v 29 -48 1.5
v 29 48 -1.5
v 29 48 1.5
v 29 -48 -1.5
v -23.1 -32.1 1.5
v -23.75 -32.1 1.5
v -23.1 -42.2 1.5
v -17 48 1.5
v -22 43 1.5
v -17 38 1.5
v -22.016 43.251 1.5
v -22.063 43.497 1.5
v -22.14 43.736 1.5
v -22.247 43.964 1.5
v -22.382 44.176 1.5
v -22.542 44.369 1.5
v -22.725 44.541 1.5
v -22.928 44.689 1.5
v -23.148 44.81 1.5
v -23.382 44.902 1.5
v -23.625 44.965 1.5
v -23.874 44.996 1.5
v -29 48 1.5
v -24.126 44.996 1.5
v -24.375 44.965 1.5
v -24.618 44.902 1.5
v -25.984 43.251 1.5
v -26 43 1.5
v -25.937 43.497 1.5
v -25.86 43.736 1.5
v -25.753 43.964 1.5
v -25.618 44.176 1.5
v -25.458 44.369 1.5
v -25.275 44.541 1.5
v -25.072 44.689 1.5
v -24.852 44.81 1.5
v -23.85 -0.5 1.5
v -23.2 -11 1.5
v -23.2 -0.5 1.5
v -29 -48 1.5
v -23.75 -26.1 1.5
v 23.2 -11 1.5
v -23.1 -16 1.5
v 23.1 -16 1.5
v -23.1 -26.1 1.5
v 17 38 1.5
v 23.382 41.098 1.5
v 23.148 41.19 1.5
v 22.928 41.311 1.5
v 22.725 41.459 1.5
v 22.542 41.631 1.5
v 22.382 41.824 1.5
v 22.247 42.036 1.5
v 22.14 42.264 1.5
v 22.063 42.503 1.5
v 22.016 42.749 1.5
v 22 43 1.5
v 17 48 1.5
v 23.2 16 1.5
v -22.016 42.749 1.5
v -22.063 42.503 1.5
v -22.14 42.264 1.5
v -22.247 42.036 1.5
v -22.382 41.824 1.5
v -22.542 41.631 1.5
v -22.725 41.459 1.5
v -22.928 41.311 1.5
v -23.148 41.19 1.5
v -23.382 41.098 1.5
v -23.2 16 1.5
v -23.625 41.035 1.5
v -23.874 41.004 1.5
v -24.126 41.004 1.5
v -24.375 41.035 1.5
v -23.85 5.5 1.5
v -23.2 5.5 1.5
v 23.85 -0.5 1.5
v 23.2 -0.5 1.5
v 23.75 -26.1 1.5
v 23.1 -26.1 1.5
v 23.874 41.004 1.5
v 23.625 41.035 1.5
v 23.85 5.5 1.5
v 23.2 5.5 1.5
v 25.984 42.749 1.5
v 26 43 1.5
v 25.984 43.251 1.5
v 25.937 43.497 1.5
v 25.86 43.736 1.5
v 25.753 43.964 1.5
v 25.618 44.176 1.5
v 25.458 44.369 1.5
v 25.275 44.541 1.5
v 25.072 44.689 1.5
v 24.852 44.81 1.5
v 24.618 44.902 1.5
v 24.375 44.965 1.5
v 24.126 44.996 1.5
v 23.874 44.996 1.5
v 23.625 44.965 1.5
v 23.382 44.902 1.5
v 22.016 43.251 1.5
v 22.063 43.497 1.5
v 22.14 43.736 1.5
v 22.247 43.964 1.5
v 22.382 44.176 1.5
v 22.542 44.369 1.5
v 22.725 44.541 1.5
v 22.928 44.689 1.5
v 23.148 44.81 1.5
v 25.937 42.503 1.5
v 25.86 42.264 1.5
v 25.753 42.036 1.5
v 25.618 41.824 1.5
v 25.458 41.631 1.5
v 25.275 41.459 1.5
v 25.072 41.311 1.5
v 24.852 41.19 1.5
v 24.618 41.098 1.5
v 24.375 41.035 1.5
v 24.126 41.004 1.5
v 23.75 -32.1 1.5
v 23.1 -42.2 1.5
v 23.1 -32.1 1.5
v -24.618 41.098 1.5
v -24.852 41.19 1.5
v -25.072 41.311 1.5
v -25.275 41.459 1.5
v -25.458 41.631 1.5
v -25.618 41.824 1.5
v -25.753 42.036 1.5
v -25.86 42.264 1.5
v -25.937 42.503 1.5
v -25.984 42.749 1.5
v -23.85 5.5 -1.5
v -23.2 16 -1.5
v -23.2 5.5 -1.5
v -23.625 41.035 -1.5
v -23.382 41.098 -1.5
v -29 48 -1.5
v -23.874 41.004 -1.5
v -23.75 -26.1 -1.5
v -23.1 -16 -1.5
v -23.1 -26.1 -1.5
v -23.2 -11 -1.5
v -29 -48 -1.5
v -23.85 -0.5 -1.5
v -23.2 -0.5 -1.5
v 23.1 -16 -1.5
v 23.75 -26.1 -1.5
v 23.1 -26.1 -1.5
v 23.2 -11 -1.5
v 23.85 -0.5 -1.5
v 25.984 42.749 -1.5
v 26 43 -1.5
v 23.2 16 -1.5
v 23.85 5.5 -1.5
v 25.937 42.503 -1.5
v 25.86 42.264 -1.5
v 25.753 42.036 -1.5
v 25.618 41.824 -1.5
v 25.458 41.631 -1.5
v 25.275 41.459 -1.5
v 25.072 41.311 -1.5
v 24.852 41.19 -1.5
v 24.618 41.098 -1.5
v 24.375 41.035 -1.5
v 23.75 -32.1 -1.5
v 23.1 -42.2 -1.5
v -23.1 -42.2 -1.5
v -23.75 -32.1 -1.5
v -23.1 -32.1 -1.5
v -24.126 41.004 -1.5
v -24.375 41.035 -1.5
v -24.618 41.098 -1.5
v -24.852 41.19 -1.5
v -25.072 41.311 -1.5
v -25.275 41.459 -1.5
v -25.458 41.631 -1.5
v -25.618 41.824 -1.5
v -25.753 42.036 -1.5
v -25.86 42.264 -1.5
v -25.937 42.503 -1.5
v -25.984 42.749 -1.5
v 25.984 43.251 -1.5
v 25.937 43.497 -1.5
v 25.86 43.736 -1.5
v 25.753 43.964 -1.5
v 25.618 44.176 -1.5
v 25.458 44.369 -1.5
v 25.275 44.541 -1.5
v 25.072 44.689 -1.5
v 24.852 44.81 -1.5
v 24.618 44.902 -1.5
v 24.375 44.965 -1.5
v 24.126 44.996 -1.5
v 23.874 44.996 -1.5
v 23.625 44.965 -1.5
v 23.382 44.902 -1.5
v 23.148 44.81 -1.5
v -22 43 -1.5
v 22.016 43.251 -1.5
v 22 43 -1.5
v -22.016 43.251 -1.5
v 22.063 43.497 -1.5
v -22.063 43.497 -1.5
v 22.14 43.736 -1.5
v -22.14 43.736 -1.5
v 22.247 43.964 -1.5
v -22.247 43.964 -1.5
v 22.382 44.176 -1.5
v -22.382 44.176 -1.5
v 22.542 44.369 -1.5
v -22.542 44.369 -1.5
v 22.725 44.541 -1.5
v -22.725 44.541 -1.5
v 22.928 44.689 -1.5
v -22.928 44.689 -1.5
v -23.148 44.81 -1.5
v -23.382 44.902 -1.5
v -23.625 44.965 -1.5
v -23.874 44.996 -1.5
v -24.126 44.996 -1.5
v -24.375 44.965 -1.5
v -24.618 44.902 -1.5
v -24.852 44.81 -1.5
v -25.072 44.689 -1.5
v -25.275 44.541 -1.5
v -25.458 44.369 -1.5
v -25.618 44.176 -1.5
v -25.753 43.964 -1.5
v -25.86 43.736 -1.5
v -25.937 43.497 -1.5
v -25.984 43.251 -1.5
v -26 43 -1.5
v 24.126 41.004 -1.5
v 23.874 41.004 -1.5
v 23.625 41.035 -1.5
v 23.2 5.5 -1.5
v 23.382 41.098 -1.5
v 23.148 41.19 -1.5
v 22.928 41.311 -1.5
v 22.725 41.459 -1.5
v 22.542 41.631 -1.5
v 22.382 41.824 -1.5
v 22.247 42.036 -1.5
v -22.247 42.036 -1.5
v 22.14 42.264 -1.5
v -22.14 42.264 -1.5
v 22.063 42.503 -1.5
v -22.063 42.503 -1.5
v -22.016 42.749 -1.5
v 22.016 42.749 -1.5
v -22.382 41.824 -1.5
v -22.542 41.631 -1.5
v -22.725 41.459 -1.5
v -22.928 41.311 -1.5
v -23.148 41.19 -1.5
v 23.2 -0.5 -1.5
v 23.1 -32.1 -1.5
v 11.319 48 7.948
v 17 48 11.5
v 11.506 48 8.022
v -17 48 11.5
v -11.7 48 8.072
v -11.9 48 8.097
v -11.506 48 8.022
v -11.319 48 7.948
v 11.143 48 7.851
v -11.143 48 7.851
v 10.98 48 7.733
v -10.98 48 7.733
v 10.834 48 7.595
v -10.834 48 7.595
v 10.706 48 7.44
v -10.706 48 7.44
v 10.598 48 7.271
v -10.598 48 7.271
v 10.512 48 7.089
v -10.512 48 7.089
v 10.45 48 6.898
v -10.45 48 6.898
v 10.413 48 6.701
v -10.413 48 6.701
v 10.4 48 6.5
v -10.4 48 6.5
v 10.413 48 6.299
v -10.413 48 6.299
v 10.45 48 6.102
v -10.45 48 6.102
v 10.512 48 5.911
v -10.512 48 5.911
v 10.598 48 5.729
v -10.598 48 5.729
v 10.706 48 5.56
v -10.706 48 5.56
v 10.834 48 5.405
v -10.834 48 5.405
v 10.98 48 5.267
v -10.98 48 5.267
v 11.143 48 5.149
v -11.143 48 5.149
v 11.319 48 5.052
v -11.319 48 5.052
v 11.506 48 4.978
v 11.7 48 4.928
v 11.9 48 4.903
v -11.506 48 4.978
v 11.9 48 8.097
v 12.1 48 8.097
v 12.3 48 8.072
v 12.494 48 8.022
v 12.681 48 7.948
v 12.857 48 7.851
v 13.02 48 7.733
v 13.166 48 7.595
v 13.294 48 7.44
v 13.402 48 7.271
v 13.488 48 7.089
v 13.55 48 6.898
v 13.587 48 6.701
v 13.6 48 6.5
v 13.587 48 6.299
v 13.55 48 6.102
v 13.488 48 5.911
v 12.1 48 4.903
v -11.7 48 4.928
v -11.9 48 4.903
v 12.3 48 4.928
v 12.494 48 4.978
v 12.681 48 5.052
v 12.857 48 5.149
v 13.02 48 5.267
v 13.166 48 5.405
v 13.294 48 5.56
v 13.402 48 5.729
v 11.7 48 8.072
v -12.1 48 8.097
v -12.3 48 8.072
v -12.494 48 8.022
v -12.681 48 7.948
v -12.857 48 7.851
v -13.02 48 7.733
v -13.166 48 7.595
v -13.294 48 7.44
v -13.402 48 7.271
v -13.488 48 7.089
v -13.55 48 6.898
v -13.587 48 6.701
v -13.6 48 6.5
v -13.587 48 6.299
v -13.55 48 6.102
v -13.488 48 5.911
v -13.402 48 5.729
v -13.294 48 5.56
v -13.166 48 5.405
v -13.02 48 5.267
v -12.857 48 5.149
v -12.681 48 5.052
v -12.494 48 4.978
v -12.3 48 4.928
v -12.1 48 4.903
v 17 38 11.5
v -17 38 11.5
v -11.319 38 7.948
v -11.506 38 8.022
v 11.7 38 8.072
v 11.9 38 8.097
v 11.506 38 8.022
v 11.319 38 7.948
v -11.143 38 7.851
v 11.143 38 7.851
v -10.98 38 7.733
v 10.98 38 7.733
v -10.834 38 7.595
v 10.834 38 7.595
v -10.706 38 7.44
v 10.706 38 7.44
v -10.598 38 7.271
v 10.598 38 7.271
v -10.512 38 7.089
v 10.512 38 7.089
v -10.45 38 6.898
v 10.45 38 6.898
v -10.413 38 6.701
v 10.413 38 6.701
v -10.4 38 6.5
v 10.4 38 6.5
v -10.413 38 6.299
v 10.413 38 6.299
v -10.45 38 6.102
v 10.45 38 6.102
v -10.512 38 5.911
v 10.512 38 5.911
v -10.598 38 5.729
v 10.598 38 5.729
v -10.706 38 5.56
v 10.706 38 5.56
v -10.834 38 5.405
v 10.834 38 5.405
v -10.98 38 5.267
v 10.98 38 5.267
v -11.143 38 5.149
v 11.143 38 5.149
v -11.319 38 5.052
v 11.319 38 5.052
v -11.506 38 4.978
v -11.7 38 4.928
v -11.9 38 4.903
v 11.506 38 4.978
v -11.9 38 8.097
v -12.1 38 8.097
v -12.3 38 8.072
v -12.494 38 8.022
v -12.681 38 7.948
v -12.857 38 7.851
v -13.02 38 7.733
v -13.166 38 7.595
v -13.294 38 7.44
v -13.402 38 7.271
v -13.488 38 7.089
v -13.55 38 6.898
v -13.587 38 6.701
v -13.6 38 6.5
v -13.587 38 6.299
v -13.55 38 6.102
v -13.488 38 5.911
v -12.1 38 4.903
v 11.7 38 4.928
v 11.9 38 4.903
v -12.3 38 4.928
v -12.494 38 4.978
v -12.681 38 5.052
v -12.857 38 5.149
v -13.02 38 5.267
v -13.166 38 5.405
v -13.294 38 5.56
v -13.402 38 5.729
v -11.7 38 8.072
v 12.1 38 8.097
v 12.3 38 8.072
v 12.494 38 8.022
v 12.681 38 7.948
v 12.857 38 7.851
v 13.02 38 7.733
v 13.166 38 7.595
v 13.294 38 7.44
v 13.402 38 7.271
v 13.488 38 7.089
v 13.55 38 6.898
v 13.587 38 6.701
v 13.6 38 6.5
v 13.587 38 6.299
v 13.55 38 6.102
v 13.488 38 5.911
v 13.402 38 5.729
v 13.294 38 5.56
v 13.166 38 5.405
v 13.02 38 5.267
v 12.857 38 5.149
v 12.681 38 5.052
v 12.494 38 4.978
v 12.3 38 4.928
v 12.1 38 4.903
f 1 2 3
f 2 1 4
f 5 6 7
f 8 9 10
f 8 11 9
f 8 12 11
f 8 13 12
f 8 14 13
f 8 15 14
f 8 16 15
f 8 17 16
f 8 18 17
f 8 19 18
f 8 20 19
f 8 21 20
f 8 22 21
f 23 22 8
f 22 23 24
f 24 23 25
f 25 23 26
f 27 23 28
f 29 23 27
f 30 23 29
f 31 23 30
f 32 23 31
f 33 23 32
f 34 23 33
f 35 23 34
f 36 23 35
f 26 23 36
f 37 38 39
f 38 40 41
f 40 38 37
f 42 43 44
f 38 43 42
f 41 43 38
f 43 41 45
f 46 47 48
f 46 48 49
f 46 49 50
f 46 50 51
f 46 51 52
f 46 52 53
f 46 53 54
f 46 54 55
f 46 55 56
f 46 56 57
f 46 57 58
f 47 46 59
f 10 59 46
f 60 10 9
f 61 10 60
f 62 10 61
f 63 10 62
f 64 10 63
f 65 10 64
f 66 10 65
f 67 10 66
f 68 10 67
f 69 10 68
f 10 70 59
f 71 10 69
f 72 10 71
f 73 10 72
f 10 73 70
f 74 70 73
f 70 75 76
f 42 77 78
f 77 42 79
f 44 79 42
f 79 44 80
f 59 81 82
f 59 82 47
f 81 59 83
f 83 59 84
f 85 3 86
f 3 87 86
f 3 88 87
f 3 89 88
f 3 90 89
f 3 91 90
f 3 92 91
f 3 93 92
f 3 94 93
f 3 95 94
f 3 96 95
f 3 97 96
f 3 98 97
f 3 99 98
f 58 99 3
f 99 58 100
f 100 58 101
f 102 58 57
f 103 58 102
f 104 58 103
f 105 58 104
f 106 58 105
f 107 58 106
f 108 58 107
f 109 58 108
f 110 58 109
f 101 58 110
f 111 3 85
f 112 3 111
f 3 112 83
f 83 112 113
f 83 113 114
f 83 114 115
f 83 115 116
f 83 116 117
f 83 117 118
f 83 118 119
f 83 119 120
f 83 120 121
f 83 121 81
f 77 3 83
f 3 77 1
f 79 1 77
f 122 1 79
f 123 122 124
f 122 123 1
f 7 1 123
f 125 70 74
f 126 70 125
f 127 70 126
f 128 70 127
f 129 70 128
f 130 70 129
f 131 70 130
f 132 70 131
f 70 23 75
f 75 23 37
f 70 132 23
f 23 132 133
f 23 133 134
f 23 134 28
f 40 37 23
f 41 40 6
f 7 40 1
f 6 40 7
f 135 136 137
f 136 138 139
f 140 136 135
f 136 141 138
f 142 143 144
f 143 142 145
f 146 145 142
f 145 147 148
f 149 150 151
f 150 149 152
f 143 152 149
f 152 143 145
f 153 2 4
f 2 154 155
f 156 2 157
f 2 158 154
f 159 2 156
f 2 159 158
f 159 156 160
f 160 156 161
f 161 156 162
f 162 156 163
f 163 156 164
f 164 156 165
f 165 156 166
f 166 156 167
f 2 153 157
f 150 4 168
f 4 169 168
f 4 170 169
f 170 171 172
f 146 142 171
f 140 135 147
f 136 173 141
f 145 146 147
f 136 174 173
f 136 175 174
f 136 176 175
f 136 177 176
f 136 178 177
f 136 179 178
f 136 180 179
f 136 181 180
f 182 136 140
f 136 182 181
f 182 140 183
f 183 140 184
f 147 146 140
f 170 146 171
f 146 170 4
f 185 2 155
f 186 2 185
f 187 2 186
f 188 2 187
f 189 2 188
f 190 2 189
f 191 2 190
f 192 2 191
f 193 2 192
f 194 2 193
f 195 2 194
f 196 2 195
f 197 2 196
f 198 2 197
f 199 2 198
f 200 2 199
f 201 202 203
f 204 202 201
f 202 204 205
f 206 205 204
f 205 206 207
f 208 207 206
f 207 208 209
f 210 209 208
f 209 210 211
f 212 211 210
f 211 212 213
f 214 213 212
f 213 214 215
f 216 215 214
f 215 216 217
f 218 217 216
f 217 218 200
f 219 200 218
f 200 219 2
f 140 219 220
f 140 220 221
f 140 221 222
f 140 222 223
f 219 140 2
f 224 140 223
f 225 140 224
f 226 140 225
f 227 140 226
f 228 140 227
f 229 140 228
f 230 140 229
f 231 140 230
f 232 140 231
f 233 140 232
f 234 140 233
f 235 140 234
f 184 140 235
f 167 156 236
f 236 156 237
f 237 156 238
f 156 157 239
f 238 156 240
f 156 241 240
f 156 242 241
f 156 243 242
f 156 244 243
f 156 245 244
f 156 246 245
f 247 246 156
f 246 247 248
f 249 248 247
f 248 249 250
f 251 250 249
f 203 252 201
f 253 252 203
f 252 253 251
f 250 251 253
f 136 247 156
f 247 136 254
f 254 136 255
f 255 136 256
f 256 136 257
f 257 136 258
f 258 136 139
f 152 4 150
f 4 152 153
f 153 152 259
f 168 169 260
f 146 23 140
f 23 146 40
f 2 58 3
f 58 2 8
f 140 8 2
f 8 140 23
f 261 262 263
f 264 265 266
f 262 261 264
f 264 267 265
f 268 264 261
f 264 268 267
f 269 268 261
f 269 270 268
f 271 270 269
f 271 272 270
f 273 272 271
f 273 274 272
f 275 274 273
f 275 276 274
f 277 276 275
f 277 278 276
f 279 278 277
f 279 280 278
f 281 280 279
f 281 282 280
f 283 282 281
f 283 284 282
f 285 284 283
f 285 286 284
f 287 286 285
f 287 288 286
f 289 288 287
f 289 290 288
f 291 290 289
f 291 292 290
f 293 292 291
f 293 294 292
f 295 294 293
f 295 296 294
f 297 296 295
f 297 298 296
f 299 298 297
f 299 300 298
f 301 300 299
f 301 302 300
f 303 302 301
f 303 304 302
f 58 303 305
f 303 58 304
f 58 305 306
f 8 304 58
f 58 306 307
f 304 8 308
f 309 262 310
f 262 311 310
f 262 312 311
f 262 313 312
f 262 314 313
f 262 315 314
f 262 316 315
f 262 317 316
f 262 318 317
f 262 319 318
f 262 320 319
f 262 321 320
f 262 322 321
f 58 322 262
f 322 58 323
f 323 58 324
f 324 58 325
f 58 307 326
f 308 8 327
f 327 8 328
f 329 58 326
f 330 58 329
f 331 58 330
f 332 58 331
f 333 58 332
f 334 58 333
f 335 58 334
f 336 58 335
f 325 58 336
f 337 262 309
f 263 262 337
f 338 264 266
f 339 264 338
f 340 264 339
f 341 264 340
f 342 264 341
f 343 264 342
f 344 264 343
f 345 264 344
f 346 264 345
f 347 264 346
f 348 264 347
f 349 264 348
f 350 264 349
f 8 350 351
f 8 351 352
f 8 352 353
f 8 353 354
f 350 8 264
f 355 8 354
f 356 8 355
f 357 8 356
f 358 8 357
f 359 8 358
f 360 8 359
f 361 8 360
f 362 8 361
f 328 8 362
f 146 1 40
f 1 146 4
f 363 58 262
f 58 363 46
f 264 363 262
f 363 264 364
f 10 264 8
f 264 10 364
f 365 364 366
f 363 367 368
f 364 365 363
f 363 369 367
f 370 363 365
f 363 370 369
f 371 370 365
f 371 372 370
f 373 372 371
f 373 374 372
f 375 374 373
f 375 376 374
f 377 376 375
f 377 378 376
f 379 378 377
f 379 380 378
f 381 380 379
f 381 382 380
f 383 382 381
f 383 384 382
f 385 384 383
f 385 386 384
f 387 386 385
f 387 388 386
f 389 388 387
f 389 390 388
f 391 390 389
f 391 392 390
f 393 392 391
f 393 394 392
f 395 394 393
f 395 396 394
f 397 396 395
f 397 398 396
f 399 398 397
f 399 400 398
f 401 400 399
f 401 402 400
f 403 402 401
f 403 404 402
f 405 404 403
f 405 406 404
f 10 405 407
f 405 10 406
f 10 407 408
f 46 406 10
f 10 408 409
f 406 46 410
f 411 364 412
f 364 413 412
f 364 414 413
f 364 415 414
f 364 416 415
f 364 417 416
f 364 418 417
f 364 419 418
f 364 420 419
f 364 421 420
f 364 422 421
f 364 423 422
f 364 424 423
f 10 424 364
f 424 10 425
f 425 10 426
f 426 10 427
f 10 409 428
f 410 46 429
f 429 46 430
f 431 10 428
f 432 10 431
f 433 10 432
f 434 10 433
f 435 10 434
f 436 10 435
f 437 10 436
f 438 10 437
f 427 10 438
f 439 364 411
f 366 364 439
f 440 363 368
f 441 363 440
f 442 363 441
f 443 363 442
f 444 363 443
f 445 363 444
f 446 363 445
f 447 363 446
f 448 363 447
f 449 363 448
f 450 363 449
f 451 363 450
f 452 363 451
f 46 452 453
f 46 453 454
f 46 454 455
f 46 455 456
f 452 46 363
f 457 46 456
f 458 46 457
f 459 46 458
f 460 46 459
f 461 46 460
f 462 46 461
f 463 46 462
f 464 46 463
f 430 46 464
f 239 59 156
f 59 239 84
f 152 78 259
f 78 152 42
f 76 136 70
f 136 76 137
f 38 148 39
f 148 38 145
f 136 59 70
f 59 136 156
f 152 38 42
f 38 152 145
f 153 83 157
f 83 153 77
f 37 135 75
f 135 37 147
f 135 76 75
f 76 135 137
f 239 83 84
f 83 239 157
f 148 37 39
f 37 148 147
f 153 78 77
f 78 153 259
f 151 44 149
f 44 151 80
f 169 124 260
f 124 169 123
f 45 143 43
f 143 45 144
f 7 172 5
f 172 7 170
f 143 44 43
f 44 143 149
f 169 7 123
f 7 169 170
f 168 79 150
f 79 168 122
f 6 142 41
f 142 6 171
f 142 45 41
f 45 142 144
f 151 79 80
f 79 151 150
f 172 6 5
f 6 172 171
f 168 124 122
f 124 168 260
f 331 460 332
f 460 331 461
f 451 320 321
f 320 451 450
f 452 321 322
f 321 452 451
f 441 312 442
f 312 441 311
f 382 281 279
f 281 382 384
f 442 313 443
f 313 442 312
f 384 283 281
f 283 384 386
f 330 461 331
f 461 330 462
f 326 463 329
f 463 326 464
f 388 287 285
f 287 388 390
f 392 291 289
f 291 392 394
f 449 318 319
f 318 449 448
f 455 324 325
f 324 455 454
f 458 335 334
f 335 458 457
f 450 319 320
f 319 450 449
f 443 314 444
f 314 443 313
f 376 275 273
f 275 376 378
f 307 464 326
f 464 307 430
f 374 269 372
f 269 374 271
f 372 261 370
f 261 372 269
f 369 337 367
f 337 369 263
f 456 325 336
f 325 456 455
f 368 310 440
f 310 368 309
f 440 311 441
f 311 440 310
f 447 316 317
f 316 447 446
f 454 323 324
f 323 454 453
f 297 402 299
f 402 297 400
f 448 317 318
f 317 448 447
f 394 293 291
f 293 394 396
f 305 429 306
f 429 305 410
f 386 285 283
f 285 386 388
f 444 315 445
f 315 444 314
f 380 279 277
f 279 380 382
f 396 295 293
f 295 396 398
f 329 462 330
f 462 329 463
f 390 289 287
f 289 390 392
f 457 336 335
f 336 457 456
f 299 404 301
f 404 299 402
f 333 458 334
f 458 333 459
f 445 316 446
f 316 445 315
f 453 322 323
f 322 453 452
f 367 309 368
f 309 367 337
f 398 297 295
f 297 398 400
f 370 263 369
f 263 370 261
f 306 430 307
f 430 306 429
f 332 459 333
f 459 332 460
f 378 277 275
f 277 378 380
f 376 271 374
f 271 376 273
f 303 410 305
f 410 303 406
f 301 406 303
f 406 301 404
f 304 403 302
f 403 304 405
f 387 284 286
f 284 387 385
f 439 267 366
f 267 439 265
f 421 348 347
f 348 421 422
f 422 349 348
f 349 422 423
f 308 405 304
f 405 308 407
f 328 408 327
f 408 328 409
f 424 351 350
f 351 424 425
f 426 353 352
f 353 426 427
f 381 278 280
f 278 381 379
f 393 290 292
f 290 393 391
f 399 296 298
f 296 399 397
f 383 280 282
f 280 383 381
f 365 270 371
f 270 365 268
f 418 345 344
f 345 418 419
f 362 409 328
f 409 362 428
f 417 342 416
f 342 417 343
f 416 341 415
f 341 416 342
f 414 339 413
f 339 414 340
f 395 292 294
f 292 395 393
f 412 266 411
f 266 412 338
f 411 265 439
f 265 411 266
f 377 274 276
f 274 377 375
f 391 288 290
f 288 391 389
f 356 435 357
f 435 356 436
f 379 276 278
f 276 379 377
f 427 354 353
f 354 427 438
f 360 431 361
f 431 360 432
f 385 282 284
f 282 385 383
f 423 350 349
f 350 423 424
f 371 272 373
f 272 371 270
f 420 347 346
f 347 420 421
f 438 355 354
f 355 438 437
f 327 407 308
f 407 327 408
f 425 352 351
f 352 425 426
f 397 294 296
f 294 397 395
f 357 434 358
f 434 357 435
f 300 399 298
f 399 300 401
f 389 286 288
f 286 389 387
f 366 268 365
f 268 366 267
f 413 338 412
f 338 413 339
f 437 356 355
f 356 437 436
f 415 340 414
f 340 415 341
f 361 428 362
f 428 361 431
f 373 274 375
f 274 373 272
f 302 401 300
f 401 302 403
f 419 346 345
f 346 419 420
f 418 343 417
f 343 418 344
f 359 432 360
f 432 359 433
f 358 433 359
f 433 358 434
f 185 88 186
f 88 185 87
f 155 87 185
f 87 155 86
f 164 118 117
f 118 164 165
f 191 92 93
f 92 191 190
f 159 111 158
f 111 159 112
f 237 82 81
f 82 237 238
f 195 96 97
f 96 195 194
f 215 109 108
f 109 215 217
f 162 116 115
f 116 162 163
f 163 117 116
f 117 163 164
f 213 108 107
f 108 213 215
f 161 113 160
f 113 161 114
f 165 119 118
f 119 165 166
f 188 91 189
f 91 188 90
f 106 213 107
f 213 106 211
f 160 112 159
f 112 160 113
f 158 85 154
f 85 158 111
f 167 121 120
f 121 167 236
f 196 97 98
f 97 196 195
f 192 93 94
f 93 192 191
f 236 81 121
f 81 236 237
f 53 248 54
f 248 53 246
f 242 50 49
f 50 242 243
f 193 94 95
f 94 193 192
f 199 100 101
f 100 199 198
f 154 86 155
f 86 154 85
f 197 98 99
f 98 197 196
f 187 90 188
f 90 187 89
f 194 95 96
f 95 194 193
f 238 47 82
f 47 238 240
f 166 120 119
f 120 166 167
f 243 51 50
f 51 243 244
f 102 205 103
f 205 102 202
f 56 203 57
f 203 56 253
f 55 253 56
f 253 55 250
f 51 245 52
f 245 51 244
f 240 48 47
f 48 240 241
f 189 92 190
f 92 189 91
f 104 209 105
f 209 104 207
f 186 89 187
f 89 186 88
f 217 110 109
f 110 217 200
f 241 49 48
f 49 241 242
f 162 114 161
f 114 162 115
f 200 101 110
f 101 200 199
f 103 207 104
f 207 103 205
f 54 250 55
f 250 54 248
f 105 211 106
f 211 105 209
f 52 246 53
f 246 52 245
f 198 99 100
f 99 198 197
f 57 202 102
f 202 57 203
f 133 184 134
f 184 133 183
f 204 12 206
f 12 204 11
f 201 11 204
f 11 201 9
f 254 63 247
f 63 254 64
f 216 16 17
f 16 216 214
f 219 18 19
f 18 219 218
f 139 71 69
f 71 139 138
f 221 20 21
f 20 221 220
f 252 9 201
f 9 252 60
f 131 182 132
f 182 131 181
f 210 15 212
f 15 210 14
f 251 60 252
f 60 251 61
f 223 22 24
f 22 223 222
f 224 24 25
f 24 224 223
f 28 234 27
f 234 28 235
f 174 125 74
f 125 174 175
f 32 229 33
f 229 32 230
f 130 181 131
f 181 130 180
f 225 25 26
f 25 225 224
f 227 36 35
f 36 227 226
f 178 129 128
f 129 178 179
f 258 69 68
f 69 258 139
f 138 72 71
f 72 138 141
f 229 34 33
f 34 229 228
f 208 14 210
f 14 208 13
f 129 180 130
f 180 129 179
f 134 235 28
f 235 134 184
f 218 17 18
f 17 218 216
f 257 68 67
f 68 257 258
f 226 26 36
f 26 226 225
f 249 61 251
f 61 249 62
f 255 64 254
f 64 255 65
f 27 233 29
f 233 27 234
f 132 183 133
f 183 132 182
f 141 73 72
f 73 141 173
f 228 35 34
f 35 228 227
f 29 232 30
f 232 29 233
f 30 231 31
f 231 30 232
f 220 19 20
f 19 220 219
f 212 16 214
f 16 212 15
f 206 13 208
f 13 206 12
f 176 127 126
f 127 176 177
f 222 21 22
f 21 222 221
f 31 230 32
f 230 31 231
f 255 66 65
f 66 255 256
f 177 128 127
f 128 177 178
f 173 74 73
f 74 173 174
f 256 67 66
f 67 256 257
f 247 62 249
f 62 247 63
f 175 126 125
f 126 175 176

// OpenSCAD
// meter bezel

water_meter_height = 27;
water_meter_length = 46.4;
meter_height = 26.2;
meter_length = 46.2;

// distance from top
glass_blackout = 32;
meter_separation = 32;

bezel_margin = 6;
bezel_thickness = 3;
bezel_height = glass_blackout + 13 + meter_separation + 13 + bezel_margin;
bezel_width = 46 + 2 * bezel_margin;

m4_dia = 4;
m4_pilot = 3.2;
vert_m4_x_offset = (bezel_width - (2*10) - 4 - 10)/2;

mounting_block_thickness = 10;
mounting_block_depth = 10;

$fn = 50;

difference () {
    {
        union () {
        cube([bezel_width, bezel_height, bezel_thickness], center = true);
        
        // mounting block
        translate([0,
            bezel_height/2  - mounting_block_thickness/2,
            bezel_thickness/2 + mounting_block_depth/2])
        cube([bezel_width - 2 * 10 - 4, mounting_block_thickness, mounting_block_depth], center = true);
        }
    }
    {
        // top meter
        // water temp
        translate([0, bezel_height/2 - glass_blackout - water_meter_height/2, 0])
        cube([water_meter_length, water_meter_height, bezel_thickness], center = true);
        
        translate([0, bezel_height/2 - glass_blackout - water_meter_height/2, 0])
        cube([47.7, 6, bezel_thickness], center = true);
        
        // bottom meter
        // air temp
        translate([0, 
            bezel_height/2 - glass_blackout - meter_height/2 - meter_separation, 
            0])
        cube([meter_length, meter_height, bezel_thickness], center = true);
        
        // mounting relief
        translate([0, 
            bezel_height/2 - glass_blackout - meter_height/2 - meter_separation, 
            0])
        cube([47.5, 6, bezel_thickness], center = true);       
        
        // mounting holes
        // - bezel to plate - vertical holes
        // THREAD
        translate([vert_m4_x_offset,
            bezel_height/2 - bezel_thickness - 4/2,
            bezel_thickness/2 + mounting_block_depth/2])
        rotate([90,0,0])
        cylinder(r = m4_pilot/2, h = mounting_block_thickness, center = true);
        
        translate([-vert_m4_x_offset,
            bezel_height/2 - bezel_thickness - 4/2,
            bezel_thickness/2 + mounting_block_depth/2])
        rotate([90,0,0])
        cylinder(r = m4_pilot/2, h = mounting_block_thickness, center = true);
        
        // - bezel to plate - horizontal holes
        // PASS-THRUE
        translate([bezel_width/2 - 10/2,
            bezel_height/2  - 10/2,
            0])
        cylinder(r = m4_dia/2, h = 4, center = true);
        
        translate([-(bezel_width/2 - 10/2),
            bezel_height/2  - 10/2,
            0])
        cylinder(r = m4_dia/2, h = 4, center = true);
    }
}
